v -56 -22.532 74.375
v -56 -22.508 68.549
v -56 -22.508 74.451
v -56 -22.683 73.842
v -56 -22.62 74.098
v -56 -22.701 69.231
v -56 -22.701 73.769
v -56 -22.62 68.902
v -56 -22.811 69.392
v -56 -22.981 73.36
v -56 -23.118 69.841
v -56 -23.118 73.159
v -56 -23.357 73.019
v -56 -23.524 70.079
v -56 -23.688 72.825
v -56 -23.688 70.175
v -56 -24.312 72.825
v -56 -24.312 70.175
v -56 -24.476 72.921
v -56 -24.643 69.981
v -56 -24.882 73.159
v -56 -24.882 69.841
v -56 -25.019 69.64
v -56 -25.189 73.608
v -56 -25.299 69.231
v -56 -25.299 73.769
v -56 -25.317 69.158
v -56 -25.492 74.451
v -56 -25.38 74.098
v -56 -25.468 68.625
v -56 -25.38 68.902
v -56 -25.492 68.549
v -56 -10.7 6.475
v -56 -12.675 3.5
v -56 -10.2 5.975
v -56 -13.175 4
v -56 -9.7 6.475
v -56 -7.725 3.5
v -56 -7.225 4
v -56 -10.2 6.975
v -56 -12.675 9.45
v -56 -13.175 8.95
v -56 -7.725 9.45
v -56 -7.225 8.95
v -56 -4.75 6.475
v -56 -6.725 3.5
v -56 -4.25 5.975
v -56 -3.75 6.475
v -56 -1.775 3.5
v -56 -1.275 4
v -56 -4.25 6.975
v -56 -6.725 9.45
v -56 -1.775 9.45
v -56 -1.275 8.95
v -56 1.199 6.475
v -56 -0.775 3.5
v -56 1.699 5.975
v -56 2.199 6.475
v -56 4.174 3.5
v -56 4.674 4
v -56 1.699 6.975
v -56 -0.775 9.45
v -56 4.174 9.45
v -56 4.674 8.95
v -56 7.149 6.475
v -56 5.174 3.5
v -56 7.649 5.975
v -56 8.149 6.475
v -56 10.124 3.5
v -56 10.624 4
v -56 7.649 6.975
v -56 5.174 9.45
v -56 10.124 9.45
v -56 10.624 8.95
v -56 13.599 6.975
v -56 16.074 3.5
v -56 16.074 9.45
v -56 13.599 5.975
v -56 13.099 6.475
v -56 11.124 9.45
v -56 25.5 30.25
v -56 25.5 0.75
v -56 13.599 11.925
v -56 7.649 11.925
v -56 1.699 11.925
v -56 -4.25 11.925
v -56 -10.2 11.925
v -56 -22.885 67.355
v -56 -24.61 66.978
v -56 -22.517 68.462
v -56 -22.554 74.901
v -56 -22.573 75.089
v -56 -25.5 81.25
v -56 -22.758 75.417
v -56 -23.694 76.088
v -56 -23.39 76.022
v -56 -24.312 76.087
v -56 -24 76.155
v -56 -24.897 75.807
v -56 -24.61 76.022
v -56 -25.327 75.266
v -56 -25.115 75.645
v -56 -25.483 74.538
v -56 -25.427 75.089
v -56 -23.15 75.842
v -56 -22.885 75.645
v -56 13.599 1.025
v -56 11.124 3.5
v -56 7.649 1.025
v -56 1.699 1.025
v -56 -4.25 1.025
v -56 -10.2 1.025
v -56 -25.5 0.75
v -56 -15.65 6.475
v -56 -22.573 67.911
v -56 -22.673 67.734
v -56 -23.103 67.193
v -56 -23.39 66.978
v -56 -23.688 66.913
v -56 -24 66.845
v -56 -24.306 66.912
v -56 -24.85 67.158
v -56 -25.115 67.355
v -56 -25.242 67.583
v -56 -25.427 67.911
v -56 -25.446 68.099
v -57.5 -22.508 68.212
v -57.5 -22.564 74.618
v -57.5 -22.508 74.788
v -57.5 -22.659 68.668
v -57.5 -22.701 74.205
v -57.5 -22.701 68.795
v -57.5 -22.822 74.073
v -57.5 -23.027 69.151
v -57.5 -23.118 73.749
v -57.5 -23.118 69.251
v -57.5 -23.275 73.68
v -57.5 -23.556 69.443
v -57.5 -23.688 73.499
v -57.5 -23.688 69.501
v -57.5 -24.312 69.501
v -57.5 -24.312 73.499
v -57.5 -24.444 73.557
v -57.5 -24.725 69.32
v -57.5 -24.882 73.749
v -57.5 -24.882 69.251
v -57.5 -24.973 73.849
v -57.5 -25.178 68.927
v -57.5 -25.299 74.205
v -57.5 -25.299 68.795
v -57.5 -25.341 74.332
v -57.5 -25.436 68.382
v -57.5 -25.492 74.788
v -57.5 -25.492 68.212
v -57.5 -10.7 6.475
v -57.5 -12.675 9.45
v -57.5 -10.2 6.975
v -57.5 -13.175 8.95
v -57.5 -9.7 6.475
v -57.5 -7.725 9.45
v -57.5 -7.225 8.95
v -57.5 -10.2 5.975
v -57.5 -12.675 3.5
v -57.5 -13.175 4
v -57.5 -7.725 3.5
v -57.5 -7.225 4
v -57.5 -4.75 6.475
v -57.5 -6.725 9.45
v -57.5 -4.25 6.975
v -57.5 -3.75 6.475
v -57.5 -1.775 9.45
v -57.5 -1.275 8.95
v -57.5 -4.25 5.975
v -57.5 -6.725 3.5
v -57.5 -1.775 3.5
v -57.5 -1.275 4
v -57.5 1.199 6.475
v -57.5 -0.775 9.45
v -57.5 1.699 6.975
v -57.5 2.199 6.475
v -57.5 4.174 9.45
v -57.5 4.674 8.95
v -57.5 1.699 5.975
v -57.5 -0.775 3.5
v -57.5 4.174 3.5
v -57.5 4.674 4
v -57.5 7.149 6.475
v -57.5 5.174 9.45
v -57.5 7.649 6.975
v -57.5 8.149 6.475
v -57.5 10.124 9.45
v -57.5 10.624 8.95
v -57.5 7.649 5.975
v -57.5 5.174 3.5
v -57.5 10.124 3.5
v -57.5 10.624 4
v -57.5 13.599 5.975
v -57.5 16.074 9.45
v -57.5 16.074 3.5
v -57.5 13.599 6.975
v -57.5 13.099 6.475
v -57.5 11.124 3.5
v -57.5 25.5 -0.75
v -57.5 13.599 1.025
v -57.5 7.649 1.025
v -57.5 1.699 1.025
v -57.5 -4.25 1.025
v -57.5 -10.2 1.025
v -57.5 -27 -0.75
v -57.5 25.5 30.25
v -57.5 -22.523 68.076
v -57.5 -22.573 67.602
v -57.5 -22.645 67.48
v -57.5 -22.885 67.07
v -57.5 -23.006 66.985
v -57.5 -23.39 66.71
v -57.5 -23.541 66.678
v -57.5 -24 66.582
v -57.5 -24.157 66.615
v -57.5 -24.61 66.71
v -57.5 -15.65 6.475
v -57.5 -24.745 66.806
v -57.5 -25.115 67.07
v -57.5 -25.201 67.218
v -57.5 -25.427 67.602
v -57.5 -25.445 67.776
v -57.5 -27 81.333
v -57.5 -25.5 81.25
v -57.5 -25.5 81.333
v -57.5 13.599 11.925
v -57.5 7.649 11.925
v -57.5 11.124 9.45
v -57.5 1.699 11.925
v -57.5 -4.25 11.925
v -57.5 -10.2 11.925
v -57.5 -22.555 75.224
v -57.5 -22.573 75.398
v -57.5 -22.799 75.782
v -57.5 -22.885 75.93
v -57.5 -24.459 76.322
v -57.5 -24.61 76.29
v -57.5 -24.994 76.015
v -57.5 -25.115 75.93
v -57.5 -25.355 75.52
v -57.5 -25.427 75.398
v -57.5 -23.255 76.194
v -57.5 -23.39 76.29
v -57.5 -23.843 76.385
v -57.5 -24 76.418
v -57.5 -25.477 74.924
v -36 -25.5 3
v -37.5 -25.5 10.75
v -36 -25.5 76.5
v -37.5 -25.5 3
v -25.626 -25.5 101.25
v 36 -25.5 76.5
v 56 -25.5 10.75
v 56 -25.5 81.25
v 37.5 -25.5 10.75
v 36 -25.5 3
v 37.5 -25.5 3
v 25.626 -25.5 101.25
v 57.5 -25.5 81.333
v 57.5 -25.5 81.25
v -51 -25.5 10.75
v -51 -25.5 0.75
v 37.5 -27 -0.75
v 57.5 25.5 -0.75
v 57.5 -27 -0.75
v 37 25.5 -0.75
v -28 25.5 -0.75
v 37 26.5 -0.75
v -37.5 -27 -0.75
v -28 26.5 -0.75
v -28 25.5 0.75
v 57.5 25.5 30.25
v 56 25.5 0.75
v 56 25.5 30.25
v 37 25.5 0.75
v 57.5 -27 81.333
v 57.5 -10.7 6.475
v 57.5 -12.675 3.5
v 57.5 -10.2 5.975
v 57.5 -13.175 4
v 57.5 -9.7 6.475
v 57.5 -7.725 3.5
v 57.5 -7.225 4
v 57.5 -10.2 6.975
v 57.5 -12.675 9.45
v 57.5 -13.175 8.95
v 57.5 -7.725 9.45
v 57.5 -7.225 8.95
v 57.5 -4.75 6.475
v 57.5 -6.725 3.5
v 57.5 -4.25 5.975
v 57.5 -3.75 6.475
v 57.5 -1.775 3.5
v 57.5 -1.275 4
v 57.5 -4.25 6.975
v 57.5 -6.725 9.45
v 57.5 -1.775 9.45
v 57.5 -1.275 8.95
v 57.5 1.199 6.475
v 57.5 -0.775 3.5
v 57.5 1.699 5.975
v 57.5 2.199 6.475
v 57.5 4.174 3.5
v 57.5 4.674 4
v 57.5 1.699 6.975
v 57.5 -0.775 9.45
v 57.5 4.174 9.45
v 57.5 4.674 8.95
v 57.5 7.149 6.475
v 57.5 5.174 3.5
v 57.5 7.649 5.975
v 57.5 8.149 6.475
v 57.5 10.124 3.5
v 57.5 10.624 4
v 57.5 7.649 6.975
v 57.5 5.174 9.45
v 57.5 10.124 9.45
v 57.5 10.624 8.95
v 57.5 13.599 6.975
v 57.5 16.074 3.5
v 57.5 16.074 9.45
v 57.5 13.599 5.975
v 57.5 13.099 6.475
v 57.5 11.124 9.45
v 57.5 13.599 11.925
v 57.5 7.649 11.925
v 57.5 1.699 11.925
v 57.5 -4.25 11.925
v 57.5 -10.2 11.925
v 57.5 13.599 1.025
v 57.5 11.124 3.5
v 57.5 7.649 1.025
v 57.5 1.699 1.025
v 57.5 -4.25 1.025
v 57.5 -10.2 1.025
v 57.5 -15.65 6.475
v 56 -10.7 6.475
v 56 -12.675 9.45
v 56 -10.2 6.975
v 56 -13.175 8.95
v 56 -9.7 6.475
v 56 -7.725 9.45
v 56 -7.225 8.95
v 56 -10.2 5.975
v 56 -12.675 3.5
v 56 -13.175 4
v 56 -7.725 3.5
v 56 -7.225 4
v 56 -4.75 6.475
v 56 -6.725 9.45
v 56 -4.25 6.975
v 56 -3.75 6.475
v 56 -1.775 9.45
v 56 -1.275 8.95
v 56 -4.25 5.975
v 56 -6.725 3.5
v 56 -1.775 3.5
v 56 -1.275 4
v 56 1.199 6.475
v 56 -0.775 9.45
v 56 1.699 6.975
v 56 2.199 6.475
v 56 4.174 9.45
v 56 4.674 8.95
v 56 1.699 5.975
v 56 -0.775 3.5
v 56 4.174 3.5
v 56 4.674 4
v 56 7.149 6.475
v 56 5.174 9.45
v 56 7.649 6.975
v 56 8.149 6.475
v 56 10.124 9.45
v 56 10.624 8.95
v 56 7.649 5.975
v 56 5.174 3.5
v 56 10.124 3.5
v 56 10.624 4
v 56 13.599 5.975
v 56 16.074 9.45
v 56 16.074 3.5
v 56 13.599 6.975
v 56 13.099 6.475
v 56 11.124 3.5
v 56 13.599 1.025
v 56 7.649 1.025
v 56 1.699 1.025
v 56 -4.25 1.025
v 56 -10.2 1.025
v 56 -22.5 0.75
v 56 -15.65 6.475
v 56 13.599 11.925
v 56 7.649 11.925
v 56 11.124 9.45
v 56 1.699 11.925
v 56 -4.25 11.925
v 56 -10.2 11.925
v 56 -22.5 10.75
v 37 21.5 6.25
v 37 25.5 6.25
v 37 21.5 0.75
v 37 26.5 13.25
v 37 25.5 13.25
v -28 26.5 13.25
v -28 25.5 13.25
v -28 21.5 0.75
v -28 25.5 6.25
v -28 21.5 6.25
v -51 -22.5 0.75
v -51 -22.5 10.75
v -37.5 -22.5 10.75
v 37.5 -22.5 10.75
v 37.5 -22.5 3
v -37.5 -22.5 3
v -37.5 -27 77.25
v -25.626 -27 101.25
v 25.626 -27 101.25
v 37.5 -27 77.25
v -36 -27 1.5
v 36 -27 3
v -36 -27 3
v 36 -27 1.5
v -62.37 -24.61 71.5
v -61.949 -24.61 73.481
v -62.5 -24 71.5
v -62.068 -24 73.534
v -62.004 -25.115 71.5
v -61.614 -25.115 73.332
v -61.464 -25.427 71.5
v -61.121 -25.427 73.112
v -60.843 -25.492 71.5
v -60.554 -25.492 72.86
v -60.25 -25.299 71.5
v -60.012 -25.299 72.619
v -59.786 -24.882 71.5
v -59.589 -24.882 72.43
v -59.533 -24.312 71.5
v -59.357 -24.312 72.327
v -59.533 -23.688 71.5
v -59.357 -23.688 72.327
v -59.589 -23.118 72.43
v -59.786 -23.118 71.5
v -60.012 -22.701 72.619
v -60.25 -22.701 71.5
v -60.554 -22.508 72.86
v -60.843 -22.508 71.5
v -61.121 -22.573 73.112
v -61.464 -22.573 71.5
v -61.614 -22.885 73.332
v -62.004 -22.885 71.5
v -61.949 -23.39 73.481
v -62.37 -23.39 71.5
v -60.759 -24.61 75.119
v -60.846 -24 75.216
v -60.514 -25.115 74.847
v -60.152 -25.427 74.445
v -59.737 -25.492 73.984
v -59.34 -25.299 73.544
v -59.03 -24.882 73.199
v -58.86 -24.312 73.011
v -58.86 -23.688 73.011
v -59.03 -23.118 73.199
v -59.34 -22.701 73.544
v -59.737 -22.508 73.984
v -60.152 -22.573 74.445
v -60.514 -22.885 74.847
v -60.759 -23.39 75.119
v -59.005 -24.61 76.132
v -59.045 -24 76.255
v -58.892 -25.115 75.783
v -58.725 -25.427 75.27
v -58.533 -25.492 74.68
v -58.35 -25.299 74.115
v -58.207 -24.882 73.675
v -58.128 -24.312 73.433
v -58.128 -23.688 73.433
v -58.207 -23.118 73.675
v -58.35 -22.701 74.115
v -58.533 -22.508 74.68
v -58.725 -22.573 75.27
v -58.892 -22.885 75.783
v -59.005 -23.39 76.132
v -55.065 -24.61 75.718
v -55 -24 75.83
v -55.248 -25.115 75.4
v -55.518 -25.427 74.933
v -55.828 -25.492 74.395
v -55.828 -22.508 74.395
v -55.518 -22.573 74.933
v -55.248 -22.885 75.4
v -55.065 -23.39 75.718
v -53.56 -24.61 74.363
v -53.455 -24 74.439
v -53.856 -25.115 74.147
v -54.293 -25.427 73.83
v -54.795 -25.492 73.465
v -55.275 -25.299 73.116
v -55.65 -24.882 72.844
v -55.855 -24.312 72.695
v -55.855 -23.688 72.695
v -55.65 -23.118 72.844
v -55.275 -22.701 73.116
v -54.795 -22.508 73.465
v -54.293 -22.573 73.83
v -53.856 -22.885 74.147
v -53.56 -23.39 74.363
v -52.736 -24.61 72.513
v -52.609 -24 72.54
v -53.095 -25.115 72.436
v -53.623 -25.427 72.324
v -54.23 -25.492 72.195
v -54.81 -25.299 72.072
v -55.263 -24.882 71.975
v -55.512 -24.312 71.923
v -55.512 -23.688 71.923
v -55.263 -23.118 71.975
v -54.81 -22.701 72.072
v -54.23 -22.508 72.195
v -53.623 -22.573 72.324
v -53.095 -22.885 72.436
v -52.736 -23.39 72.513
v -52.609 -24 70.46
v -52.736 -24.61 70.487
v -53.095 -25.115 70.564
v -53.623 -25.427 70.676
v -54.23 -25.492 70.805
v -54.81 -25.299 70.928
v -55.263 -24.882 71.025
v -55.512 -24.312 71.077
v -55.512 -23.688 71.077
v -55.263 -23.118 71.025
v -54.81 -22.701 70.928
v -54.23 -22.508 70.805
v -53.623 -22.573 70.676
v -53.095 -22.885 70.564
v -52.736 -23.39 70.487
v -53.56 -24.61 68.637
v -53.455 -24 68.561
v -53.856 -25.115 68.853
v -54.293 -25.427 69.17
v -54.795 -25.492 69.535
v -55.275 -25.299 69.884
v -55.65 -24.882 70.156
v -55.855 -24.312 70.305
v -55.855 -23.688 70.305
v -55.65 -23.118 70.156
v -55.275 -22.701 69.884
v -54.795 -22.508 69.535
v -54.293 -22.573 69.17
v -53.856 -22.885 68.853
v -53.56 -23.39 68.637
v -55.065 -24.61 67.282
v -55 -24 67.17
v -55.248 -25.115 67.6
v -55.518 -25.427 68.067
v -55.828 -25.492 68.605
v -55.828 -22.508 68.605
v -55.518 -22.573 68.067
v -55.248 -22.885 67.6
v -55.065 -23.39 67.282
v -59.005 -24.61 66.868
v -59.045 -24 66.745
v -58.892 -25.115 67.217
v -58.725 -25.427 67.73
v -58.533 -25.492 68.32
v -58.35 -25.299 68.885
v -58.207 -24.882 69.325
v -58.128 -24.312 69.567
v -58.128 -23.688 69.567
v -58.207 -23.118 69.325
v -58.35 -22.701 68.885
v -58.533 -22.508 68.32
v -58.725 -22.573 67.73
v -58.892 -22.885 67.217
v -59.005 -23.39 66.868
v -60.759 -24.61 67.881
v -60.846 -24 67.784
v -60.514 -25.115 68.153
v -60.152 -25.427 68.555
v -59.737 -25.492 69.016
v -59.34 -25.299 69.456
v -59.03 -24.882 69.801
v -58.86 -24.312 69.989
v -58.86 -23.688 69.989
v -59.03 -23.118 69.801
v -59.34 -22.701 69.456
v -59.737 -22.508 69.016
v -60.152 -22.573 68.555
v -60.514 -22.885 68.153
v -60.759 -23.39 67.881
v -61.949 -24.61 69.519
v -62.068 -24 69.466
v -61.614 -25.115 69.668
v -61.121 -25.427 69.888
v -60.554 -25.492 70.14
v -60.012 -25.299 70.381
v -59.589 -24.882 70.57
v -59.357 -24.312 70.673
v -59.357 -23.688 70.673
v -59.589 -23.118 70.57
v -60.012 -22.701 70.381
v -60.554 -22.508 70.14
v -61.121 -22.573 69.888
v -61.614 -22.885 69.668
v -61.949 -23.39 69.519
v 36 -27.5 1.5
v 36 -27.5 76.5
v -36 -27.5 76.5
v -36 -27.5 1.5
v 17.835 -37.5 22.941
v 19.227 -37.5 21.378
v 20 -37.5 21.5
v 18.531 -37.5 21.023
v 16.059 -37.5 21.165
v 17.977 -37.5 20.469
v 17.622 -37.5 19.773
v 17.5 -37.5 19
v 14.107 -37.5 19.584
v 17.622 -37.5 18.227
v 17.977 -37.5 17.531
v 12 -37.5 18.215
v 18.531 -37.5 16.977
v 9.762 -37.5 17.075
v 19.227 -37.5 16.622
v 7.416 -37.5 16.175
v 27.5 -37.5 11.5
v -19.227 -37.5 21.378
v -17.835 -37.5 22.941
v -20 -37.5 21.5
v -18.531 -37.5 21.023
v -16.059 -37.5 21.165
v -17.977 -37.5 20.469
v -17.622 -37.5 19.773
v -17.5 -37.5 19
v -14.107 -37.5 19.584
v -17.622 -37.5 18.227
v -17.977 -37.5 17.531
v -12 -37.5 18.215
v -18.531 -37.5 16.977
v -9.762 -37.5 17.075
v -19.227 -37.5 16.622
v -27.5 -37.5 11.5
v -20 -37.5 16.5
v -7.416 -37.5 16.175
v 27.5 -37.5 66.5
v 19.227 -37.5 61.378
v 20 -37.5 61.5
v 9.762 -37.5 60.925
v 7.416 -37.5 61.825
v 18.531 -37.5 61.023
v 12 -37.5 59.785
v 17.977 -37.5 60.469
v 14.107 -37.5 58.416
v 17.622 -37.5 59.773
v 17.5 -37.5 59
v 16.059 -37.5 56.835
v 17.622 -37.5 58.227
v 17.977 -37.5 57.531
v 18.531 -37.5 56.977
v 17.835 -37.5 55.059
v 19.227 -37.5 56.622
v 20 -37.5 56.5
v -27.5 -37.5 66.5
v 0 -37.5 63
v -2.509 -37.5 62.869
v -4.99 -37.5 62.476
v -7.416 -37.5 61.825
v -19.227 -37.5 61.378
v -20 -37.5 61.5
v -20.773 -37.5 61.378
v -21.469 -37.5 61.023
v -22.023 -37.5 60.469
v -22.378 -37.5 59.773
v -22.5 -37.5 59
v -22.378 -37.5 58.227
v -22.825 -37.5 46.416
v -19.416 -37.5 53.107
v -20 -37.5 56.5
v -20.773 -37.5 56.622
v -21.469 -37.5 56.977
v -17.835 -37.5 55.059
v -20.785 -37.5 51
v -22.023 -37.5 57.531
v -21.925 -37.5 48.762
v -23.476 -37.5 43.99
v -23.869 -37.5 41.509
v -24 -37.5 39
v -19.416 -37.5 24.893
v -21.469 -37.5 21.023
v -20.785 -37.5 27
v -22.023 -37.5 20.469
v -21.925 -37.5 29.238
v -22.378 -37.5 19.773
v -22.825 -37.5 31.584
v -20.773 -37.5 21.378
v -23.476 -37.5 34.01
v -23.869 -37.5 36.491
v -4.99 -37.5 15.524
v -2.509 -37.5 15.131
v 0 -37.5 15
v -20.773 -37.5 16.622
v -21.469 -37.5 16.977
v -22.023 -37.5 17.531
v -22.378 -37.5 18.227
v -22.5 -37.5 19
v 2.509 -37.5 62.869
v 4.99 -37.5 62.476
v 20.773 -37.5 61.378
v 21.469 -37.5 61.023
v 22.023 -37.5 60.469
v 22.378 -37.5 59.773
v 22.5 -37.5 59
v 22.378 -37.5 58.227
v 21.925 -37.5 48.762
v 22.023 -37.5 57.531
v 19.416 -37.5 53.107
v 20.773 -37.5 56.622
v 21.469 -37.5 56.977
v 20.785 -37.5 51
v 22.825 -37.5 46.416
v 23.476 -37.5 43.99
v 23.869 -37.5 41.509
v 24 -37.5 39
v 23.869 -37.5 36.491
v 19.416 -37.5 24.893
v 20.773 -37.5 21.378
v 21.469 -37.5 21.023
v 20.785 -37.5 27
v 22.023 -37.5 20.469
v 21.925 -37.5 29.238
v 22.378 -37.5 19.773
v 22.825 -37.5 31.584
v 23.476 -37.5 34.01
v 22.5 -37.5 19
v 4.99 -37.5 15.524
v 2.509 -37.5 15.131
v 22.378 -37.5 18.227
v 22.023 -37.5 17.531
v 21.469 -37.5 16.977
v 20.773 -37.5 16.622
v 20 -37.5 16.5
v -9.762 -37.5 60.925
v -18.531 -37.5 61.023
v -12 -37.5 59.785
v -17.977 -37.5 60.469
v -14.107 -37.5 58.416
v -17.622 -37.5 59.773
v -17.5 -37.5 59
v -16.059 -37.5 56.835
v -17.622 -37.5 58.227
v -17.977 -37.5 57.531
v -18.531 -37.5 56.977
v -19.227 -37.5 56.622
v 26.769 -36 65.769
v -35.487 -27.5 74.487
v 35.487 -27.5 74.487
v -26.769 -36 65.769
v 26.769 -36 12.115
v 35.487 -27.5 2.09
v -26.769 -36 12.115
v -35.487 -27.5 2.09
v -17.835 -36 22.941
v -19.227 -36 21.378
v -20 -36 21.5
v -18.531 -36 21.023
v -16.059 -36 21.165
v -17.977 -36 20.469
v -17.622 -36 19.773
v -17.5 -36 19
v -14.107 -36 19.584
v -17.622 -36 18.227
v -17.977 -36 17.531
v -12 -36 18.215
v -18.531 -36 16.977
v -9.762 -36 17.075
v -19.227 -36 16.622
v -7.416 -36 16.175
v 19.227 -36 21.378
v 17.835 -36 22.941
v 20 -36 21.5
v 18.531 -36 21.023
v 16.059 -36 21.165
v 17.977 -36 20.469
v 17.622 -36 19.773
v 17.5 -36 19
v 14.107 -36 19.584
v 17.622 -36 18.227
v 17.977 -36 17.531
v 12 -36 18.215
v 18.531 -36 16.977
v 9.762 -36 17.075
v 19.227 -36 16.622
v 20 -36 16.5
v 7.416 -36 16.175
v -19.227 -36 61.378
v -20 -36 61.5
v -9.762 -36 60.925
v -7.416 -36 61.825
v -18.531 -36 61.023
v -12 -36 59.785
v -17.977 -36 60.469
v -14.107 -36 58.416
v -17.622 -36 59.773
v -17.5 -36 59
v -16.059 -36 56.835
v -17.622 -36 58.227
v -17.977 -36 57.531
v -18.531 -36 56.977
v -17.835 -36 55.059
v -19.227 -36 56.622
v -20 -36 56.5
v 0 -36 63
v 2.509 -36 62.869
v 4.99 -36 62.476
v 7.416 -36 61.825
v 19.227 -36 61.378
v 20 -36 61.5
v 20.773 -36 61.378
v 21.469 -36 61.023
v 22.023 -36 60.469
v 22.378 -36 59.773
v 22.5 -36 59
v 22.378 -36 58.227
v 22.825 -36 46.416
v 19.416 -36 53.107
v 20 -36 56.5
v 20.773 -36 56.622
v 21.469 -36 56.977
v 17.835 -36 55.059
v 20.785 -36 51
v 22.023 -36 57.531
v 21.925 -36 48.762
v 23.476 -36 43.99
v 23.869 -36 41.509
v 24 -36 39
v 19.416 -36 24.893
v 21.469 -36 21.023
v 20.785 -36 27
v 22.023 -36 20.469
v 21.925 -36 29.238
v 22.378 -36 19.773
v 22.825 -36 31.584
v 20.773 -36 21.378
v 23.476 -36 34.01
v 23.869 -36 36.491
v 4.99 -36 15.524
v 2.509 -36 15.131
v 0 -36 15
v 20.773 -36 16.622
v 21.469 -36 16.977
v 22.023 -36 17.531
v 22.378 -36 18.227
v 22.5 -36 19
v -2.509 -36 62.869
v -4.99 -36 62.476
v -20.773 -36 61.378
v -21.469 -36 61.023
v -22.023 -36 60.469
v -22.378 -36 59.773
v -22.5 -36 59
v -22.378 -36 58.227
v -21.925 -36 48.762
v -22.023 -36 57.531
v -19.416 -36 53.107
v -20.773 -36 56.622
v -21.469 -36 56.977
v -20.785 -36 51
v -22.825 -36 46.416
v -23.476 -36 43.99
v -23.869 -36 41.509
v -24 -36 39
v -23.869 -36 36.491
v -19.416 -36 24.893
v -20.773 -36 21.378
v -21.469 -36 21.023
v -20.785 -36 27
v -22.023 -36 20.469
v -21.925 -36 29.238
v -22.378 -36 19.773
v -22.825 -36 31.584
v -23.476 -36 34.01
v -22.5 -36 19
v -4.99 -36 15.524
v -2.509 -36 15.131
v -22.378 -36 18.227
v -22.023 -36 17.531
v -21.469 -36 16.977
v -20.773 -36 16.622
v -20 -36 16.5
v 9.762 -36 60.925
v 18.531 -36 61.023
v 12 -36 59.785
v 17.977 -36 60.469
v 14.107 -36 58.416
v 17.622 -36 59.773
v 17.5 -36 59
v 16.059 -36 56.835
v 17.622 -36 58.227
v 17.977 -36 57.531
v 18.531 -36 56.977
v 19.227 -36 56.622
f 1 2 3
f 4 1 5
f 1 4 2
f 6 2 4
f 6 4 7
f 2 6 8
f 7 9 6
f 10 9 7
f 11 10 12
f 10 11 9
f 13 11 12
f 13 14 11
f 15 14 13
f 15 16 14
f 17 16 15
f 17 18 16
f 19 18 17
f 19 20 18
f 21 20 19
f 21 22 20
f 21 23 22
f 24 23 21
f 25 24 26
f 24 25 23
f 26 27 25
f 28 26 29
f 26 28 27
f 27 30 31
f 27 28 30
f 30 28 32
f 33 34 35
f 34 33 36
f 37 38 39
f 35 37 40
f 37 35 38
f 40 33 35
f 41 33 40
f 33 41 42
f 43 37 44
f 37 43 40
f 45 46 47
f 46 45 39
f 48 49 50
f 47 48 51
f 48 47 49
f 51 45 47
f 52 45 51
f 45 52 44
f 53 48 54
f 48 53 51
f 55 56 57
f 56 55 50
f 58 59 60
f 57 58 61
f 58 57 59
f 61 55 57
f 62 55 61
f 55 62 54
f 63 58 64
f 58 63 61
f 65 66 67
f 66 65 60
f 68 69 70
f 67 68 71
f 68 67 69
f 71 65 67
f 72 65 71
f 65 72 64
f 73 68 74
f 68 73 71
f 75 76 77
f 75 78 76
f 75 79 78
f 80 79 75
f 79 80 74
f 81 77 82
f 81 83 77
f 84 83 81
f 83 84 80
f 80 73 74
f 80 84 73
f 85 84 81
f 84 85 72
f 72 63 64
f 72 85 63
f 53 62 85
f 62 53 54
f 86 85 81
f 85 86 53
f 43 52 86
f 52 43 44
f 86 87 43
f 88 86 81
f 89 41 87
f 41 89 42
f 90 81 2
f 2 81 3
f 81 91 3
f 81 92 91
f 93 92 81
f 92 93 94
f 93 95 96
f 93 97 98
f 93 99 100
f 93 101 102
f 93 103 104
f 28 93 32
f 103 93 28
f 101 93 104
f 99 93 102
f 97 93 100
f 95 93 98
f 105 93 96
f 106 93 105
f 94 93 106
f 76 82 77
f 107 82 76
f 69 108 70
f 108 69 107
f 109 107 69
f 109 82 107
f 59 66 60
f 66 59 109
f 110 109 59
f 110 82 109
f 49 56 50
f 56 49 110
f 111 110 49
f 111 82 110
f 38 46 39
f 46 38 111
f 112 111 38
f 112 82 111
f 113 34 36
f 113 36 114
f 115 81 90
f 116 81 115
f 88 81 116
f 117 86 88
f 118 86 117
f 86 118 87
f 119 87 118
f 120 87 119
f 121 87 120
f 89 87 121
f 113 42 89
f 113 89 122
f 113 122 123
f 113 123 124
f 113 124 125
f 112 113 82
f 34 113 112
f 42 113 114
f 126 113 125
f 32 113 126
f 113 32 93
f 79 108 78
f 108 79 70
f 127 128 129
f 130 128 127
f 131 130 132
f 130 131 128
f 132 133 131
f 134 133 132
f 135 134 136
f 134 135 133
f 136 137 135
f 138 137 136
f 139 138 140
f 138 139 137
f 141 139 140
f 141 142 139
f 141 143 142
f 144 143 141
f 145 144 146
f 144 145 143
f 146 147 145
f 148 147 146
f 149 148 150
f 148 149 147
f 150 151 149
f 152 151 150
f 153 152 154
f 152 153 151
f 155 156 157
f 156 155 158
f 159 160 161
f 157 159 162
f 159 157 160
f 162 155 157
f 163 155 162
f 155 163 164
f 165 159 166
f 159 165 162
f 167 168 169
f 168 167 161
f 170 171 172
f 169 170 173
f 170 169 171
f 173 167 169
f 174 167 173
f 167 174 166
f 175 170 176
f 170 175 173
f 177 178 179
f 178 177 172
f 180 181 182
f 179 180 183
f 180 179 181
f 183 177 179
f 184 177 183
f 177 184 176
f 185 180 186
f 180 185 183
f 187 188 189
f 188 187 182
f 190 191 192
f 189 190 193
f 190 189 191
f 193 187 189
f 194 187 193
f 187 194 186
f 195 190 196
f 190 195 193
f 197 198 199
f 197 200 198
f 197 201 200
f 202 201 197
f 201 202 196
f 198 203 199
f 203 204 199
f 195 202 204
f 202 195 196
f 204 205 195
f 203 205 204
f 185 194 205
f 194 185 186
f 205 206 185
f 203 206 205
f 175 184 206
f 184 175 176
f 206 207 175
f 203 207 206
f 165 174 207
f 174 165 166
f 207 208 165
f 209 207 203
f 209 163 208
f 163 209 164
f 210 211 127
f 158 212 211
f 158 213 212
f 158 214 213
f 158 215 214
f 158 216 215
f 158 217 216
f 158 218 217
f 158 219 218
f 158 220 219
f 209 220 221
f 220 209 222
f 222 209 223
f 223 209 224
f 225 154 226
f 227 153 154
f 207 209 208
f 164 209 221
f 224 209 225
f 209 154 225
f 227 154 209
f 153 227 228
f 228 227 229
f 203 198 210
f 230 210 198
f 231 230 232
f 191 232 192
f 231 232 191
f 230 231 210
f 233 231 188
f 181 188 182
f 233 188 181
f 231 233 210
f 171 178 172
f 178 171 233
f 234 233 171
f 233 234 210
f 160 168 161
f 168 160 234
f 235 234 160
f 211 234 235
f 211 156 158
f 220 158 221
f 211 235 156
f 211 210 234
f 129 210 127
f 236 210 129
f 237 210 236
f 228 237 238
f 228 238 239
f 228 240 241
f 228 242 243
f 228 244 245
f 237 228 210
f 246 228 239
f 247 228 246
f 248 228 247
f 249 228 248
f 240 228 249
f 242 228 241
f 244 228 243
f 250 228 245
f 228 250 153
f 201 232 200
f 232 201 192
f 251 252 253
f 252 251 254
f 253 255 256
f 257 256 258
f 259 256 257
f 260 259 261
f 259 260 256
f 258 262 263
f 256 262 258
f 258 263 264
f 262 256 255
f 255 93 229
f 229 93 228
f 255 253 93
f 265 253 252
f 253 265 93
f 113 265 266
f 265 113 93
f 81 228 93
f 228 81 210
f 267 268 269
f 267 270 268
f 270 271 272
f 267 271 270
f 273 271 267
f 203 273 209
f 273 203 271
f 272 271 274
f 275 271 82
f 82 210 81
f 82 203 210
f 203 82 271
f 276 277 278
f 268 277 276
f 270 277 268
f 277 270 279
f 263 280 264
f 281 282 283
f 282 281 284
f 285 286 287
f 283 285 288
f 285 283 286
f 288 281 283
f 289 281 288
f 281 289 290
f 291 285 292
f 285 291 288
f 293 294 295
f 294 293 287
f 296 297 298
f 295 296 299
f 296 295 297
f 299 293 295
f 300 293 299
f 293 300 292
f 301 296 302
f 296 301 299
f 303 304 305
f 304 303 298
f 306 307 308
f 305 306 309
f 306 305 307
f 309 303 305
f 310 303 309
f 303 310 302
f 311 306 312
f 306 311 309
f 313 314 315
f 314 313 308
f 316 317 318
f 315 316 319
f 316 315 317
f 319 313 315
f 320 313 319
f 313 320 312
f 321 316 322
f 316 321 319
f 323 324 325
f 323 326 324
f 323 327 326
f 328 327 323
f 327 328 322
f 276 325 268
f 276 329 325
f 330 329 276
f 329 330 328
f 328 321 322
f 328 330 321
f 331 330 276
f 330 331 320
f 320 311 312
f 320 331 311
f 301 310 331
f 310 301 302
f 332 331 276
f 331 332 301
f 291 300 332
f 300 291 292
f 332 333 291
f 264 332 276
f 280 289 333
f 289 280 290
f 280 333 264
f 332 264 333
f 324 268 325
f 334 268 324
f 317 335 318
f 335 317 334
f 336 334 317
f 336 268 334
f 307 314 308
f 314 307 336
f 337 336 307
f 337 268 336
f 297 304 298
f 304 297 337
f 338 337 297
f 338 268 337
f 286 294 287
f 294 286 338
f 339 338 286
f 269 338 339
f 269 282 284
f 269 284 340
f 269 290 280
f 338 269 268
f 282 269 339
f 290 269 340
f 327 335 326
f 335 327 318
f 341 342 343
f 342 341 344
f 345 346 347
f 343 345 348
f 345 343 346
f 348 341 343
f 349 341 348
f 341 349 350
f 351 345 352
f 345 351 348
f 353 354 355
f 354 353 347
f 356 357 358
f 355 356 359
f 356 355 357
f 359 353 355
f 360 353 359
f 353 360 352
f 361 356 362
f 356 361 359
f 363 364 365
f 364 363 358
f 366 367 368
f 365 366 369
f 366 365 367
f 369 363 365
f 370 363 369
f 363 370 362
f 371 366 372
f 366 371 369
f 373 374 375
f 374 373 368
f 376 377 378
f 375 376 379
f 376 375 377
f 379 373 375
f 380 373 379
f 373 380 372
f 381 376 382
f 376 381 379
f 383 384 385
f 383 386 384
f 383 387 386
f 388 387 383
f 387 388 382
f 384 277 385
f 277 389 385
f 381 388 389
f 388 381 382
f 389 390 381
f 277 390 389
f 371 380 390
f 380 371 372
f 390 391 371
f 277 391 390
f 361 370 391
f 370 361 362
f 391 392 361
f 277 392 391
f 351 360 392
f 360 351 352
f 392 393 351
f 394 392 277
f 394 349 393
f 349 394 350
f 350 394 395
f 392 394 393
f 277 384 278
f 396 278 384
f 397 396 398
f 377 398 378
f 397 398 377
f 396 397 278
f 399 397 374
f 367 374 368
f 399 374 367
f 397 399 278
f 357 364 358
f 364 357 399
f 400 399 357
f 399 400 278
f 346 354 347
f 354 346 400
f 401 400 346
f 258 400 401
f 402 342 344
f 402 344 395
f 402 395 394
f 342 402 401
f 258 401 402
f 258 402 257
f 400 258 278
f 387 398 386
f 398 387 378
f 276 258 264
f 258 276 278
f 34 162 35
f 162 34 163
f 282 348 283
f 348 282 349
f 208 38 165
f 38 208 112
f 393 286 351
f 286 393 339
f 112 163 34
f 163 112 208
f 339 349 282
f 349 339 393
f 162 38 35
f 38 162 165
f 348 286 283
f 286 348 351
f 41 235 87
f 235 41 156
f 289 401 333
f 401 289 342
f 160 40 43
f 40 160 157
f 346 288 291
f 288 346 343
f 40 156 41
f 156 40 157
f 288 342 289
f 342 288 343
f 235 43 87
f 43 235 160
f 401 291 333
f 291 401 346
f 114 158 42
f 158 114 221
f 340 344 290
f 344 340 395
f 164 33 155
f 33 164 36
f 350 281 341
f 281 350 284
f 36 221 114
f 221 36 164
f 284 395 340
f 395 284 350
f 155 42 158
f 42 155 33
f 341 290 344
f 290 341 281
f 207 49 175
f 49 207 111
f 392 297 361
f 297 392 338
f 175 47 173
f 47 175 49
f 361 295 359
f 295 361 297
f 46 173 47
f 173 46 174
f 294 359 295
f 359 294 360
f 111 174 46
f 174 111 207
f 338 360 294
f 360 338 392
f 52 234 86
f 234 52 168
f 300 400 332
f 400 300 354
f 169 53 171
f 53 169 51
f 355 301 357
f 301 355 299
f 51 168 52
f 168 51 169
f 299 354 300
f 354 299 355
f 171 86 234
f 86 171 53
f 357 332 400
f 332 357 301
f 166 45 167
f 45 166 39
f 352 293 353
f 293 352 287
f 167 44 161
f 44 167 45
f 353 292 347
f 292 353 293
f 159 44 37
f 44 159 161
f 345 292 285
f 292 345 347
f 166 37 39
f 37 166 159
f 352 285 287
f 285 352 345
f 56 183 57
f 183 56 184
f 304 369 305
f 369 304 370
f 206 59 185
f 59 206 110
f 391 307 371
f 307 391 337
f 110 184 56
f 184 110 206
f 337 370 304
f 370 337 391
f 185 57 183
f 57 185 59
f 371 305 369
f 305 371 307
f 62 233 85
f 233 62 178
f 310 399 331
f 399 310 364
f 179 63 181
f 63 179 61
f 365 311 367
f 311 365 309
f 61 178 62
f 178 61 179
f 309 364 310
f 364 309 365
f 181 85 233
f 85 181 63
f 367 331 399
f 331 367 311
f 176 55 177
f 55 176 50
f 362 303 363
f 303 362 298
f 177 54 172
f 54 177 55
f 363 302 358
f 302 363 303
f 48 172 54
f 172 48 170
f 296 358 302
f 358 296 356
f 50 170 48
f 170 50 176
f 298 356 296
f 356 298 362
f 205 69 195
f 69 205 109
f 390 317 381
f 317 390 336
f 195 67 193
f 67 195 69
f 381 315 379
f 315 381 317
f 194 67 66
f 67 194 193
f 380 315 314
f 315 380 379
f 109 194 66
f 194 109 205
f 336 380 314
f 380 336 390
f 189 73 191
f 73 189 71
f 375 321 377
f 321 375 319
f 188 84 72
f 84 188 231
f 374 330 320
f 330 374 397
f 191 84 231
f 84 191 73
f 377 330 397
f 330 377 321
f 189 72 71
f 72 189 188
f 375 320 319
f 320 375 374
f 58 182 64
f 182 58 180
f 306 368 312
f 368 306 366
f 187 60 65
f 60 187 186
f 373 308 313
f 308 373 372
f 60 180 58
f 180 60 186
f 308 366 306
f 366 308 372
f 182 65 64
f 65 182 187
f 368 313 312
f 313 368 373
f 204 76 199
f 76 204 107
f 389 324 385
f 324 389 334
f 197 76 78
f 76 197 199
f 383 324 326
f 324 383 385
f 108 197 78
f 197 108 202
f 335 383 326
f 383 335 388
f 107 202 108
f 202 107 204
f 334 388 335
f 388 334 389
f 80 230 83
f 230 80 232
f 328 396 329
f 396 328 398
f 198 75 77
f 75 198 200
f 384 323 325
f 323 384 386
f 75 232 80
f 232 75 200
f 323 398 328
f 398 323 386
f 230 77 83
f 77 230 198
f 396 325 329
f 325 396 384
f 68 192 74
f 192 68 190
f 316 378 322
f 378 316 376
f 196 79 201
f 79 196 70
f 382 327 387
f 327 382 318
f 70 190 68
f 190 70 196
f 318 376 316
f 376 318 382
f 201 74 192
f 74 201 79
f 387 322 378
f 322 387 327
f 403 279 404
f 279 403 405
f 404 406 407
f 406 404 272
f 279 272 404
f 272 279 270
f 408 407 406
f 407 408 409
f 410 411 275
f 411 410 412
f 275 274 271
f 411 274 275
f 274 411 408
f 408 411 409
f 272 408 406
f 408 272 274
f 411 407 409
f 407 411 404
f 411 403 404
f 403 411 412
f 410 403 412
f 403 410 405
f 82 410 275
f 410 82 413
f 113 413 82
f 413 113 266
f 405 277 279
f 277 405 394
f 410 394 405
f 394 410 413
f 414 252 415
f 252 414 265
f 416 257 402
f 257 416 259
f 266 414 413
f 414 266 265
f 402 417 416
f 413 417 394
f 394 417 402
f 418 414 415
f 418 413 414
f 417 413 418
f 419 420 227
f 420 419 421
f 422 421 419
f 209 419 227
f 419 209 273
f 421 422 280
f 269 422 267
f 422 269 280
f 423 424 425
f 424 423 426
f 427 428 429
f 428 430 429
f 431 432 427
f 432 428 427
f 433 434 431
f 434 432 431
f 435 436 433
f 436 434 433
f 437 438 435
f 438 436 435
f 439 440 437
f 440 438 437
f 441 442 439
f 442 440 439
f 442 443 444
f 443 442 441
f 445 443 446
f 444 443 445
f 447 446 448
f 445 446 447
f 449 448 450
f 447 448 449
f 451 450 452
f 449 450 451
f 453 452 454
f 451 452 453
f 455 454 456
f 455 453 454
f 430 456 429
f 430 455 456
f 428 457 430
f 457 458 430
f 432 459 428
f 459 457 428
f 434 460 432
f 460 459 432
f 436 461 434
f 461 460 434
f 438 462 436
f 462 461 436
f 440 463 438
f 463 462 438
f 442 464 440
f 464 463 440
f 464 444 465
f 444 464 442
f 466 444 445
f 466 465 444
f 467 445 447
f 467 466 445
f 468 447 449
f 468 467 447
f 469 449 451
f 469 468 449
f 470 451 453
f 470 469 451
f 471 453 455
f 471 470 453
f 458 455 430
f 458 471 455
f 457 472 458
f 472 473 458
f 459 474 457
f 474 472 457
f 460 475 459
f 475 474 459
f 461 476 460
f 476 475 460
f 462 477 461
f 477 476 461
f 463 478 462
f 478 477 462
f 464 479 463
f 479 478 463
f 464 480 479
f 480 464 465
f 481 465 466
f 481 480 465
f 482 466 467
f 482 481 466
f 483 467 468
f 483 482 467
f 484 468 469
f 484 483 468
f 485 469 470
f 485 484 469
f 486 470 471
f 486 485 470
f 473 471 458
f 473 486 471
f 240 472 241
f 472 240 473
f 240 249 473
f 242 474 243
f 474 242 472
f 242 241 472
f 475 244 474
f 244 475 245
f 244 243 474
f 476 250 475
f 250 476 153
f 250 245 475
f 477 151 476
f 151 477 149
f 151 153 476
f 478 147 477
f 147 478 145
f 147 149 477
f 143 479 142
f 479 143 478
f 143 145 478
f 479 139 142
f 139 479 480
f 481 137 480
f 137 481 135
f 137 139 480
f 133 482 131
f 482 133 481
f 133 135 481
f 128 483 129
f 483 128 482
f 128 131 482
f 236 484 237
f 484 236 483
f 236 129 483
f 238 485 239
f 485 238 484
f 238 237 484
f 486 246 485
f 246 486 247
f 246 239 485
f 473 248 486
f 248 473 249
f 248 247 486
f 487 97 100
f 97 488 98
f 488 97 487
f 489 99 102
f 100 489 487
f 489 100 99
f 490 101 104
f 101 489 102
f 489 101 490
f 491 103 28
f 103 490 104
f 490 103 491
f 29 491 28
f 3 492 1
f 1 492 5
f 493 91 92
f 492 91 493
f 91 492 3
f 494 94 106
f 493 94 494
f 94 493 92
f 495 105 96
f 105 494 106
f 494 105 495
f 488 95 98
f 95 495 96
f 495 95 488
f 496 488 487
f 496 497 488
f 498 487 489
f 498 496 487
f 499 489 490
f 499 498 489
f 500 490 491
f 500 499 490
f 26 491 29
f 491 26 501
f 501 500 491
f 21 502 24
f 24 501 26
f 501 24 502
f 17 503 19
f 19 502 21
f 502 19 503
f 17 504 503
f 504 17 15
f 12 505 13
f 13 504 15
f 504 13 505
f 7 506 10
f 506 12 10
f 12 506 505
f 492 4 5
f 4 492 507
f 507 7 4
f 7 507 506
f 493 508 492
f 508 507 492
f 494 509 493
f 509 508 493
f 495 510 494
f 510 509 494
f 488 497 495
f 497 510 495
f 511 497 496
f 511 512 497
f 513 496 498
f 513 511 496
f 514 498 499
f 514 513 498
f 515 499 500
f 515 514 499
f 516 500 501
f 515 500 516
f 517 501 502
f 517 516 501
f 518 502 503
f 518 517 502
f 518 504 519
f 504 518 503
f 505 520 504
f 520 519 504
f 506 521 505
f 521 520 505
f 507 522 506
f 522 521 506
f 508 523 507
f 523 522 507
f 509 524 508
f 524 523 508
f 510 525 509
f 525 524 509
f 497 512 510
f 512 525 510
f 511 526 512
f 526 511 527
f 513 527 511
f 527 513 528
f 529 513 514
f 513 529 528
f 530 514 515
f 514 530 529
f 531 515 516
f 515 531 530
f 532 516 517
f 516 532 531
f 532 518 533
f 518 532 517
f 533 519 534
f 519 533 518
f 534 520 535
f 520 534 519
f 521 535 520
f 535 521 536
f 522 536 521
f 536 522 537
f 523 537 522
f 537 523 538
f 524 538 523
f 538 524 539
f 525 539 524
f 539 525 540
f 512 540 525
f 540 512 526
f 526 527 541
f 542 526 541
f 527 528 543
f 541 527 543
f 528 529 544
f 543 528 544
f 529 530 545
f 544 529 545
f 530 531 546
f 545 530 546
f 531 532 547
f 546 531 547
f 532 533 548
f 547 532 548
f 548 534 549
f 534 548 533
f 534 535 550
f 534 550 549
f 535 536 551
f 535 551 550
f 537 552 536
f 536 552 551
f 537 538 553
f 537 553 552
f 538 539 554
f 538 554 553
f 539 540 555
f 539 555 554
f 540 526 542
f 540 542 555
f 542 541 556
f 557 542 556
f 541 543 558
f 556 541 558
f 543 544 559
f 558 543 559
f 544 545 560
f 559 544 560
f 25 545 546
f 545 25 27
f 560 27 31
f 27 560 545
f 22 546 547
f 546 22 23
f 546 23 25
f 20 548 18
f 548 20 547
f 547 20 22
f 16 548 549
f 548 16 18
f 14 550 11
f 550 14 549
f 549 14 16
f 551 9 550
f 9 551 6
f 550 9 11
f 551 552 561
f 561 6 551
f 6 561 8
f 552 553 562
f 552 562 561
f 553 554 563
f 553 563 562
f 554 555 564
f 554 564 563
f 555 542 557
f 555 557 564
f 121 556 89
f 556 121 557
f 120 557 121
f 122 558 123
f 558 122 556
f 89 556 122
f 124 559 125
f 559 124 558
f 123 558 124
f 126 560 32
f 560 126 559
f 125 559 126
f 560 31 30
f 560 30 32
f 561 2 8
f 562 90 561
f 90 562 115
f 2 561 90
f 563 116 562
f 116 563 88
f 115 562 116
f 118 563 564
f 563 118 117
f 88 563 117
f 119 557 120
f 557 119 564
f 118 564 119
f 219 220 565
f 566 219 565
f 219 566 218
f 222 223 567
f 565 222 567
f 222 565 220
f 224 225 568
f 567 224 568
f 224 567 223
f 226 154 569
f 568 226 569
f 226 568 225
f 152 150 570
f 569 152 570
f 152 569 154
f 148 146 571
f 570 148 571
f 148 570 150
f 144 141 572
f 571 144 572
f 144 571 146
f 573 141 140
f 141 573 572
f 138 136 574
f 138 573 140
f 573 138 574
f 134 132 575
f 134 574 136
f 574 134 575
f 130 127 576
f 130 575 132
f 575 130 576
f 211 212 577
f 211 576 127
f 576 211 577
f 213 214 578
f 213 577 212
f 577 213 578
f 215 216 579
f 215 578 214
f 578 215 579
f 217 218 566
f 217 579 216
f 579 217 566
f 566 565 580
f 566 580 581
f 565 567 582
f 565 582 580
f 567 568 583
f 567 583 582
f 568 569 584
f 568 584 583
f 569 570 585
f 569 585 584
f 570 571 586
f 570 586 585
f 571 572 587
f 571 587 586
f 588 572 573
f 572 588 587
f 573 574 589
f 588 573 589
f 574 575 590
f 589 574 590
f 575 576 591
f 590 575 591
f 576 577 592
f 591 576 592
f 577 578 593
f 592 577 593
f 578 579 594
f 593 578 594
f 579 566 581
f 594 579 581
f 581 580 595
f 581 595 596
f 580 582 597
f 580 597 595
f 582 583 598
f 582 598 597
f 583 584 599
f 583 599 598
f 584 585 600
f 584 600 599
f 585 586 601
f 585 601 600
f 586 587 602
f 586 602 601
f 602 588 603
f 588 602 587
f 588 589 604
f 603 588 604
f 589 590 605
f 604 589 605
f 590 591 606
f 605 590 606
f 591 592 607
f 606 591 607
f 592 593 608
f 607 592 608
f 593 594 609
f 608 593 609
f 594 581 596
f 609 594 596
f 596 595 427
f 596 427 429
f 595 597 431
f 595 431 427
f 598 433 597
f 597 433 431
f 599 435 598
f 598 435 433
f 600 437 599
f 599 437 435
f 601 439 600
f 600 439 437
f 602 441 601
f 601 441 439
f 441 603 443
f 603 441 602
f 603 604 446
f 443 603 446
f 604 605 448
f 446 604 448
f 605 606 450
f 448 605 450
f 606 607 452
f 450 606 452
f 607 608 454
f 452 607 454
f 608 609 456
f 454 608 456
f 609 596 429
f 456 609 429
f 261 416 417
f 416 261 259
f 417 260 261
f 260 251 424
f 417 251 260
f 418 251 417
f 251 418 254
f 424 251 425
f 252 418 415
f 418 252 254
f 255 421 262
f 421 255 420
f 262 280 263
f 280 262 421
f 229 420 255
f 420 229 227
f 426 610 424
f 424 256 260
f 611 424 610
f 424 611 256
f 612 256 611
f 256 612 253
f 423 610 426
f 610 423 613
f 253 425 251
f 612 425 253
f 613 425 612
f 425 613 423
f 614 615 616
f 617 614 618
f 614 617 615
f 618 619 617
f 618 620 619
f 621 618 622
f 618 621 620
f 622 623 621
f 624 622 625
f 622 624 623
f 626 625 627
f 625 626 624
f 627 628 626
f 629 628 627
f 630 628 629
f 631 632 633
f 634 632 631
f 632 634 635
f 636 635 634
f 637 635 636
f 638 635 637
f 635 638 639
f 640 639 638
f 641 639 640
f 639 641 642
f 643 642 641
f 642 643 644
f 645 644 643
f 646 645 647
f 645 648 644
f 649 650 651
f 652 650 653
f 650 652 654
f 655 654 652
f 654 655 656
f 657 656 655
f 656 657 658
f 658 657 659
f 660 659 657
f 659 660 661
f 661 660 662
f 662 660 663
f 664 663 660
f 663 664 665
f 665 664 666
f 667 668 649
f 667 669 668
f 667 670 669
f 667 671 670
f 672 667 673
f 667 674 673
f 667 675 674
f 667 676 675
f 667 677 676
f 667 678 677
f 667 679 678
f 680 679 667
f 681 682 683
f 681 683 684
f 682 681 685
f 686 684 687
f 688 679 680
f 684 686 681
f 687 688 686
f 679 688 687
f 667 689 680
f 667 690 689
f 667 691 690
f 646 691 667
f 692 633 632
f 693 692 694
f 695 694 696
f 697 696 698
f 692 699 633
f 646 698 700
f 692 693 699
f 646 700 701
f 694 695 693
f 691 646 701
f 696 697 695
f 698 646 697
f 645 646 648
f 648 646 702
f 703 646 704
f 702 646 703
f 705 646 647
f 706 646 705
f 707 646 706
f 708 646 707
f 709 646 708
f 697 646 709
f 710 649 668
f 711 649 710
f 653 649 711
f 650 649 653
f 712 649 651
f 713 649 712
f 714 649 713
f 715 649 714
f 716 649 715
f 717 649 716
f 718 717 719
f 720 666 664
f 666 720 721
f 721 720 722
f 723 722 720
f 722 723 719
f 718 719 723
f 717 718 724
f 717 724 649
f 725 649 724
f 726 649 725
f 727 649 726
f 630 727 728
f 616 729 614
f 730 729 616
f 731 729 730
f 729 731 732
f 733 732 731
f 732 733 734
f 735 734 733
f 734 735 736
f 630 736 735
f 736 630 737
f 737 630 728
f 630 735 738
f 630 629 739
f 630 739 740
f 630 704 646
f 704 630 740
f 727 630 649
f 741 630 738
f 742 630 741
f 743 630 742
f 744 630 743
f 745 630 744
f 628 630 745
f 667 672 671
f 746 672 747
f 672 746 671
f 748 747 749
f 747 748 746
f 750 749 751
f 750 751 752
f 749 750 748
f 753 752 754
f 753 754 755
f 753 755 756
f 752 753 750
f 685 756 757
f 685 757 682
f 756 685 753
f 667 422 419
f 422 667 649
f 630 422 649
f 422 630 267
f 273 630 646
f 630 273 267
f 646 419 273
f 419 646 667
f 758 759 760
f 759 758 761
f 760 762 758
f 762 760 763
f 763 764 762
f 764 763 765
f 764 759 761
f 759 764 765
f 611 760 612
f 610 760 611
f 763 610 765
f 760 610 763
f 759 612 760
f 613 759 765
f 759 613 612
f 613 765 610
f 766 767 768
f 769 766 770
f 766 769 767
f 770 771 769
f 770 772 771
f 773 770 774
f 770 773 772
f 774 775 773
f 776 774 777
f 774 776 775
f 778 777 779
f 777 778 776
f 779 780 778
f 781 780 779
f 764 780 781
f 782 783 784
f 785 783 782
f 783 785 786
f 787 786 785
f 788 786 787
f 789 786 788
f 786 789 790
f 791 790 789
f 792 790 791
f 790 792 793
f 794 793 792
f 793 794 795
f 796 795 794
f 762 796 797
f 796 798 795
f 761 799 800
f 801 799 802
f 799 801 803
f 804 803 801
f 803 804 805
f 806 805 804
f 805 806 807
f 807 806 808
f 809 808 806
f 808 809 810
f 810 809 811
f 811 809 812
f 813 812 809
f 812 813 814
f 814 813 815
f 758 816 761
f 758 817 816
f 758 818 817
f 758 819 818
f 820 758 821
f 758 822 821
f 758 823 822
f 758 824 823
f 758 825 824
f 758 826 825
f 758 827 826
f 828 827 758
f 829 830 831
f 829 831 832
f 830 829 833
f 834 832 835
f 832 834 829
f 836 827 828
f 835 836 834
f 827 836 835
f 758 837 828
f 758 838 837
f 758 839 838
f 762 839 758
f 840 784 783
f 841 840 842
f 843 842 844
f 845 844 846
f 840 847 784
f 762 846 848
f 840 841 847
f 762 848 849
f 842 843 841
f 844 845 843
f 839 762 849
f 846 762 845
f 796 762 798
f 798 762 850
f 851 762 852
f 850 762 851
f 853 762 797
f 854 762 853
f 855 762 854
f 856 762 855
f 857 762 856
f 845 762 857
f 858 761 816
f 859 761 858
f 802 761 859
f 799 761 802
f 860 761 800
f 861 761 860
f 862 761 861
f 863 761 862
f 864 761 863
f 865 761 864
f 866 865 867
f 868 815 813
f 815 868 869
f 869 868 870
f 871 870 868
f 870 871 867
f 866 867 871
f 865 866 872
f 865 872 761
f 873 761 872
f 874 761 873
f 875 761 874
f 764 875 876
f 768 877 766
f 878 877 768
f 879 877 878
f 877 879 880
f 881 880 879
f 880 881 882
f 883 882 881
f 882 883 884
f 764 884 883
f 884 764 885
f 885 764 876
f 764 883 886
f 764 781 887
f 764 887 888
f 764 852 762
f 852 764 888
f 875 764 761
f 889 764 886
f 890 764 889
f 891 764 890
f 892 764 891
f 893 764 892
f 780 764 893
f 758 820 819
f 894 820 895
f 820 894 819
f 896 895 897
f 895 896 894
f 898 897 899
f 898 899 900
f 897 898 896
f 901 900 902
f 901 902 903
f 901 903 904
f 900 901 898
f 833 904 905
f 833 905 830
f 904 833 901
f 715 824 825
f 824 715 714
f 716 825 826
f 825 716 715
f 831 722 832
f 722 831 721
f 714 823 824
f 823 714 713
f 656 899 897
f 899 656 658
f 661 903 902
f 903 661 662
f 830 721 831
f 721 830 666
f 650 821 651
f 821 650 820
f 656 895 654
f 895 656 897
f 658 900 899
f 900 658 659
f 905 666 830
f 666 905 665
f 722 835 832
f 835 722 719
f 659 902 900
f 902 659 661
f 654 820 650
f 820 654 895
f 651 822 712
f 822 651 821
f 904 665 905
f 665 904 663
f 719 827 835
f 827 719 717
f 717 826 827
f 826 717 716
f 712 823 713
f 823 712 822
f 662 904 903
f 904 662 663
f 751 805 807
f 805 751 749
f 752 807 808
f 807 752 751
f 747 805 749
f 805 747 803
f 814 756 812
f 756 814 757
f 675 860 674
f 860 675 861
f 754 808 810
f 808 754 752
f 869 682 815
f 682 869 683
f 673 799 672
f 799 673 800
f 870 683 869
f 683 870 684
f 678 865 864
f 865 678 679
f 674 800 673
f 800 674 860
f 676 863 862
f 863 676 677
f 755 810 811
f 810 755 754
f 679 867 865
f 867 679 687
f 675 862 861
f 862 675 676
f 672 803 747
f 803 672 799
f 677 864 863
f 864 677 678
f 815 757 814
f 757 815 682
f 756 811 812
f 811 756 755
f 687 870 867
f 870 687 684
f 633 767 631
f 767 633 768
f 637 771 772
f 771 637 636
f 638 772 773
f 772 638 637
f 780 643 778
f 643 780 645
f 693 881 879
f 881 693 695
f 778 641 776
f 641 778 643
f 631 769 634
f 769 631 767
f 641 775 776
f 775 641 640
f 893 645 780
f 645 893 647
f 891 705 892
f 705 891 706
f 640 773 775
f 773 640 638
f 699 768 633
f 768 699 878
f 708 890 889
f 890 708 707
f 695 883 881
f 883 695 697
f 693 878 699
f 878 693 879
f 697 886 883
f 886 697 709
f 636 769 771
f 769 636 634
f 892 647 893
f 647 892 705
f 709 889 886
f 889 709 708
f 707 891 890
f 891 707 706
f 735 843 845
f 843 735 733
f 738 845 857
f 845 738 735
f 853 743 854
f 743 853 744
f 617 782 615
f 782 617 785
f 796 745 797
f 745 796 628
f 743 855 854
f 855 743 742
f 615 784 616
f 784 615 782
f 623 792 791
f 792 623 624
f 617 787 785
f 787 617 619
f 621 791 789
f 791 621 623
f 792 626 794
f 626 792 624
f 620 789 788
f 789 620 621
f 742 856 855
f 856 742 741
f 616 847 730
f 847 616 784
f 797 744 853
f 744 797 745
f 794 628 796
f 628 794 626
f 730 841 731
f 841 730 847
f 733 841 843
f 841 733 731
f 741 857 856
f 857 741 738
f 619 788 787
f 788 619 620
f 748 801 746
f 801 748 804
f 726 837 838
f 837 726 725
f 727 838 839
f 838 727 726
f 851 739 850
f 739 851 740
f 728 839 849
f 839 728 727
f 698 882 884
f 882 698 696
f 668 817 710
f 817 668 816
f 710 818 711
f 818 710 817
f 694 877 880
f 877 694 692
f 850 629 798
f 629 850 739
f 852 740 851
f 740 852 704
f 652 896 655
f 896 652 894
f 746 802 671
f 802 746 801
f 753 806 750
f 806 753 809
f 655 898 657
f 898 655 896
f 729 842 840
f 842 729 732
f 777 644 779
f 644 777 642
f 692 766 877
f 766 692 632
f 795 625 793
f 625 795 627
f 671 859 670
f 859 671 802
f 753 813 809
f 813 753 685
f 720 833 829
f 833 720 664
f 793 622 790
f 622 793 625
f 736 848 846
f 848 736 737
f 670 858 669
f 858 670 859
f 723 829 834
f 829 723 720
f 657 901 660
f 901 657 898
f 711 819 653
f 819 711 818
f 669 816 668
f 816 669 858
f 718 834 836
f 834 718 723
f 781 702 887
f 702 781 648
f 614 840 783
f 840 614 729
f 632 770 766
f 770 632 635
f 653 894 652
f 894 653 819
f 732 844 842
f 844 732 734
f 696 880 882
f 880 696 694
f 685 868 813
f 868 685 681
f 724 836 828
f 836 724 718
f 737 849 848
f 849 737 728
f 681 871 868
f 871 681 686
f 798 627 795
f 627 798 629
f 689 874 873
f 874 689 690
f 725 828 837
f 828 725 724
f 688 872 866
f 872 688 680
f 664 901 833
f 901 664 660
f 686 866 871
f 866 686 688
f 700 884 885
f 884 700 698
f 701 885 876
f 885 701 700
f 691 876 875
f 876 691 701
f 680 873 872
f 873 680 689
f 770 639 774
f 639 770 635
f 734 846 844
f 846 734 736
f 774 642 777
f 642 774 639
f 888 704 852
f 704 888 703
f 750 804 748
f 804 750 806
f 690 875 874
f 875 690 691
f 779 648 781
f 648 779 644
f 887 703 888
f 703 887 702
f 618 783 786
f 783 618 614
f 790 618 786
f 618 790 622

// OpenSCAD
fan_size = 50;
vent_thickness = 10;
wall = 1.5;
screws_metric = 5;
hanger = true;
//decoration = true;

fanSupport(fan_size=fan_size,vent_thick=vent_thickness, wall=wall, screws_d=screws_metric, hanger=hanger);

//MODULES
module fanSupport(fan_size=50,vent_thick = 10, wall=1.5,height=82,screws_d=5,hanger=false, decoration=false){
    width=112;
    thick=51;
    fan_hole_margin = wall;
    min_fan_hole = width/2;
    max_fan_hole = width;
    fan_size_margin = 5;
    front_support_width = 30;
    //max_fan_hole = height < width ? height-fan_hole_margin : width-fan_hole_margin;
    fan_hole_inc = 10;
    fan_attach_size = fan_size+fan_size_margin;
    ideal_fan_hole = fan_attach_size+fan_hole_inc*2;
    //ideal_max_fan_hole = ideal_fan_hole > max_fan_hole ? max_fan_hole : ideal_fan_hole;
    real_height = height < ideal_fan_hole+wall*3 ? ideal_fan_hole+wall*3 : height;
    
    check_min_fan_hole = ideal_fan_hole > min_fan_hole ? ideal_fan_hole : min_fan_hole;
    fan_hole = check_min_fan_hole > max_fan_hole ? max_fan_hole : check_min_fan_hole;

    support_hole = fan_hole > width-front_support_width ? fan_hole-front_support_width : fan_hole;
    
    difference(){
        cover_base(wall=wall, width=width, thick=thick,height=real_height,hanger=hanger);
        translate([0,-fan_hole/2,fan_hole/2+wall*2])
        cube([support_hole, fan_hole, fan_hole], center=true);
    }
    
    translate([0,-(thick+wall)/2,0]){
        //Different front by fan size
        echo(fan_hole);
        if(fan_size > width){
            fan_bigger(fan_size=fan_attach_size,vent_thick=vent_thick, fan_hole=fan_hole,width=width, thick=thick,height=real_height, wall=wall,screws_d=screws_d,decoration=decoration);
        }else{
            fan_smaller(fan_size=fan_attach_size,vent_thick=vent_thick, fan_hole=fan_hole, width=width, thick=thick,height=real_height, wall=wall,screws_d=screws_d,decoration=decoration);
        }
    }
}

module cover_front(wall=1.5, width=112, thick=51,height=82,decoration=false){
    extension_h = 20;
    lat_top_h = height-thick;
    front_height=lat_top_h+thick;
    //Front
    translate([0,0,(front_height-wall)/2])
    cube([width+wall*2, wall, front_height], center=true);
    translate([0,0,front_height+extension_h/2-wall/2])
    difference(){
        cube([width+wall*2,wall,extension_h], center=true);
        
        translate([width/2+wall*3,0,0])
        rotate([0,32,0])
        cube([width*4,wall*2,extension_h], center=true);
        translate([-width/2-wall*3,0,0])
        rotate([0,-32,0])
        cube([width*4,wall*2,extension_h], center=true);
    }
}

module cover_base(wall=1.5, width=112, thick=51,height=82,hanger=false,decoration=false){
    //lat_top_h = 30+wall/3;
    lat_top_h = height-thick;
    big_vent_size = 3.5;
    vent_space_x = 1;
    vent_rotated_width = sqrt(pow(big_vent_size,2)*2);
    back_support_height = 14;
    back_support_width = 65;
    back_support_thick = 1;
    back_support_deviation =4.5;
    back_support_foot_thick = 4;
    front_support_wall=4.5;
    front_support_height=10;
    front_support_width_diff=5;
    hanger_r1 = 2;
    hanger_r2 = 3.5;
    
    //TOP
    cube([width,thick,wall],center=true);
    //Latterals
    difference(){
        union(){
            //Right lat
            translate([-(width+wall)/2,0,lat_top_h/2-wall/2]){
                //Lat top
                cube([wall, thick, lat_top_h], center=true);
                translate([0,0,lat_top_h/2+thick/2])
                difference(){
                    cube([wall,thick,thick],center=true);
                    rotate([-45,0,0])
                    translate([0,0,thick])
                    cube([wall*2,thick*2,thick*2],center=true);
                }
            }
            //Left lat
            translate([(width+wall)/2,0,lat_top_h/2-wall/2]){
                //Lat top
                cube([wall, thick, lat_top_h], center=true);
                translate([0,0,lat_top_h/2+thick/2])
                difference(){
                    cube([wall,thick,thick],center=true);
                    rotate([-45,0,0])
                    translate([0,0,thick])
                    cube([wall*2,thick*2,thick*2],center=true);
                }
            }
        }
        for(i = [-thick/5:vent_space_x+vent_rotated_width:thick/3]){
            translate([0,i,big_vent_size])
                rotate([45,0,0])
                cube([width*2,big_vent_size,big_vent_size], center=true);
            translate([0,i,big_vent_size+vent_rotated_width+vent_space_x])
                rotate([45,0,0])
                cube([width*2,big_vent_size,big_vent_size], center=true);
            translate([0,i-vent_rotated_width/2-vent_space_x/2,big_vent_size+vent_rotated_width/2+vent_space_x/2])
                rotate([45,0,0])
                cube([width*2,big_vent_size,big_vent_size], center=true);
        }
    }
    //Back support
    translate([back_support_deviation,thick/2+back_support_thick/2,0]){
        translate([0,0,back_support_height/2-wall/2])
            cube([back_support_width,back_support_thick,back_support_height], center=true);
        
        translate([0,-back_support_foot_thick/2-back_support_thick/2,back_support_height/4-wall/2])
           cube([back_support_width,back_support_foot_thick,back_support_height/2], center=true);
    }
    //Front Supports
    translate([front_support_width_diff/2,wall-(thick+wall)/2,front_support_height/2+wall/2])
    cube([width-front_support_width_diff,front_support_wall,front_support_height], center=true);
    // Hanger
    if(hanger){
        translate([-width/2-wall,-thick/2+wall,height-hanger_r2*2-hanger_r2])
        hanger(hanger_r1, hanger_r2);
    }
}

module fan_space(base=70, top=50, space=15,base_wall=1.5,screws_d=4, air_hole_margin=10,vertical_fan_hole=-1) {
    vertical_size = vertical_fan_hole >= 0 ? vertical_fan_hole : base;
    diff_base = base-base_wall*2;
    diff_base_v = vertical_size-base_wall;
    diff_top = top-base_wall*2;
    //diff_trans = base > top ? base_wall : -base_wall;
    difference() {
        hull() {
            // Base
            translate([0, -base_wall, (vertical_size)/2])
            cube([base,base_wall,vertical_size+base_wall*2], center = true);
            
            //Attachment
            translate([0, -space, (top+base_wall+vertical_size-top)/2])
            cube([top, base_wall, top], center = true);
        }

        //translate([0, diff_trans, 0])
        hull() {
            // Base
            translate([0, -base_wall, (vertical_size)/2])
            cube([diff_base,base_wall,diff_base_v], center = true);
            //Attachment
            translate([0, -space+base_wall, (base_wall+vertical_size)/2])
            cube([diff_top, base_wall*2, diff_top], center = true);
        }
        translate([0, 1, (vertical_size)/2+base_wall/2])
        cube([base-base_wall*2,base_wall*4+base_wall,vertical_size], center = true);
    }
    translate([0, -space, (base_wall+vertical_size)/2])
            cube([top, base_wall, top], center = true);
}

module fan_bigger(fan_size=120, vent_thick=10,fan_hole=70, wall=1.5, thick=51 ,screws_d=5,decoration=false){
    screw_margin = 5;
    hole_margin = 7;
    thick_margin = 2;
    vertical_fan_hole = fan_hole+(fan_size-fan_hole)*2;
    //Front
    difference() {
        cover_front(wall=wall, width=width, thick=thick,height=height,decoration=decoration);
        translate([0, 0,  vertical_fan_hole/2+wall])
        cube([fan_hole-wall*2,fan_hole,vertical_fan_hole],center = true);
    }
    // Hole
    translate([0, 0, wall/2])
    difference() {
        fan_space(base=fan_hole+wall*2, top=fan_size, screws_d=screws_d, base_wall=wall, space=vent_thick+thick_margin,vertical_fan_hole=vertical_fan_hole);
        
        translate([0, -vent_thick-thick_margin, (wall+vertical_fan_hole)/2])
        rotate([90, 0, 0]){
            translate([fan_size/2-screw_margin-screws_d/2, fan_size/2-screw_margin-screws_d/2, 0])
            cylinder(d=screws_d, h=wall+2, $fn=20, center=true);
            translate([-(fan_size/2-screw_margin-screws_d/2), fan_size/2-screw_margin-screws_d/2, 0])
            cylinder(d=screws_d, h=wall+2, $fn=20, center=true);
            translate([-(fan_size/2-screw_margin-screws_d/2), -(fan_size/2-screw_margin-screws_d/2), 0])
            cylinder(d=screws_d, h=wall+2, $fn=20, center=true);
            translate([fan_size/2-screw_margin-screws_d/2, -(fan_size/2-screw_margin-screws_d/2), 0])
            cylinder(d=screws_d, h=wall+2, $fn=20, center=true);

            cylinder(d=fan_size-hole_margin, h=wall+2, $fn=60, center=true);
        }
        
    }
}

module fan_smaller(fan_size=50, vent_thick=10, fan_hole=70, wall=1.5, thick=51 ,screws_d=5,decoration=false){
    screw_margin = 5;
    hole_margin = 7;
    thick_margin = 2;
    //Front
    difference() {
        cover_front(wall=wall, width=width, thick=thick,height=height,decoration=decoration);
        translate([0, 0,  fan_hole/2+wall])
        cube([fan_hole-wall*2,fan_hole,fan_hole],center = true);
    }
    // Hole
    translate([0, wall, wall/2])
    difference() {
        fan_space(base=fan_hole, top=fan_size, screws_d=screws_d, base_wall=wall, space=vent_thick+thick_margin);
        
        translate([0, 0, (fan_hole+wall)/2])
        rotate([90, 0, 0]){
            translate([fan_size/2-screw_margin-screws_d/2, fan_size/2-screw_margin-screws_d/2, 0])
            cylinder(d=screws_d, h=fan_hole*4, $fn=20, center=true);
            translate([-(fan_size/2-screw_margin-screws_d/2), fan_size/2-screw_margin-screws_d/2, 0])
            cylinder(d=screws_d, h=fan_hole*4, $fn=20, center=true);
            translate([-(fan_size/2-screw_margin-screws_d/2), -(fan_size/2-screw_margin-screws_d/2), 0])
            cylinder(d=screws_d, h=fan_hole*4, $fn=20, center=true);
            translate([fan_size/2-screw_margin-screws_d/2, -(fan_size/2-screw_margin-screws_d/2), 0])
            cylinder(d=screws_d, h=fan_hole*4, $fn=20, center=true);

            cylinder(d=fan_size-hole_margin, h=fan_hole*4, $fn=60, center=true);
        }
        
    }
}

module hanger (r1=2,r2=4){
    thick = r2-r1;
    rotate([90,0,0])
    rotate_extrude(convexity = 10, $fn = 15)
    translate([r2, 0, 0])
    circle(r = thick, $fn = 15);
}
